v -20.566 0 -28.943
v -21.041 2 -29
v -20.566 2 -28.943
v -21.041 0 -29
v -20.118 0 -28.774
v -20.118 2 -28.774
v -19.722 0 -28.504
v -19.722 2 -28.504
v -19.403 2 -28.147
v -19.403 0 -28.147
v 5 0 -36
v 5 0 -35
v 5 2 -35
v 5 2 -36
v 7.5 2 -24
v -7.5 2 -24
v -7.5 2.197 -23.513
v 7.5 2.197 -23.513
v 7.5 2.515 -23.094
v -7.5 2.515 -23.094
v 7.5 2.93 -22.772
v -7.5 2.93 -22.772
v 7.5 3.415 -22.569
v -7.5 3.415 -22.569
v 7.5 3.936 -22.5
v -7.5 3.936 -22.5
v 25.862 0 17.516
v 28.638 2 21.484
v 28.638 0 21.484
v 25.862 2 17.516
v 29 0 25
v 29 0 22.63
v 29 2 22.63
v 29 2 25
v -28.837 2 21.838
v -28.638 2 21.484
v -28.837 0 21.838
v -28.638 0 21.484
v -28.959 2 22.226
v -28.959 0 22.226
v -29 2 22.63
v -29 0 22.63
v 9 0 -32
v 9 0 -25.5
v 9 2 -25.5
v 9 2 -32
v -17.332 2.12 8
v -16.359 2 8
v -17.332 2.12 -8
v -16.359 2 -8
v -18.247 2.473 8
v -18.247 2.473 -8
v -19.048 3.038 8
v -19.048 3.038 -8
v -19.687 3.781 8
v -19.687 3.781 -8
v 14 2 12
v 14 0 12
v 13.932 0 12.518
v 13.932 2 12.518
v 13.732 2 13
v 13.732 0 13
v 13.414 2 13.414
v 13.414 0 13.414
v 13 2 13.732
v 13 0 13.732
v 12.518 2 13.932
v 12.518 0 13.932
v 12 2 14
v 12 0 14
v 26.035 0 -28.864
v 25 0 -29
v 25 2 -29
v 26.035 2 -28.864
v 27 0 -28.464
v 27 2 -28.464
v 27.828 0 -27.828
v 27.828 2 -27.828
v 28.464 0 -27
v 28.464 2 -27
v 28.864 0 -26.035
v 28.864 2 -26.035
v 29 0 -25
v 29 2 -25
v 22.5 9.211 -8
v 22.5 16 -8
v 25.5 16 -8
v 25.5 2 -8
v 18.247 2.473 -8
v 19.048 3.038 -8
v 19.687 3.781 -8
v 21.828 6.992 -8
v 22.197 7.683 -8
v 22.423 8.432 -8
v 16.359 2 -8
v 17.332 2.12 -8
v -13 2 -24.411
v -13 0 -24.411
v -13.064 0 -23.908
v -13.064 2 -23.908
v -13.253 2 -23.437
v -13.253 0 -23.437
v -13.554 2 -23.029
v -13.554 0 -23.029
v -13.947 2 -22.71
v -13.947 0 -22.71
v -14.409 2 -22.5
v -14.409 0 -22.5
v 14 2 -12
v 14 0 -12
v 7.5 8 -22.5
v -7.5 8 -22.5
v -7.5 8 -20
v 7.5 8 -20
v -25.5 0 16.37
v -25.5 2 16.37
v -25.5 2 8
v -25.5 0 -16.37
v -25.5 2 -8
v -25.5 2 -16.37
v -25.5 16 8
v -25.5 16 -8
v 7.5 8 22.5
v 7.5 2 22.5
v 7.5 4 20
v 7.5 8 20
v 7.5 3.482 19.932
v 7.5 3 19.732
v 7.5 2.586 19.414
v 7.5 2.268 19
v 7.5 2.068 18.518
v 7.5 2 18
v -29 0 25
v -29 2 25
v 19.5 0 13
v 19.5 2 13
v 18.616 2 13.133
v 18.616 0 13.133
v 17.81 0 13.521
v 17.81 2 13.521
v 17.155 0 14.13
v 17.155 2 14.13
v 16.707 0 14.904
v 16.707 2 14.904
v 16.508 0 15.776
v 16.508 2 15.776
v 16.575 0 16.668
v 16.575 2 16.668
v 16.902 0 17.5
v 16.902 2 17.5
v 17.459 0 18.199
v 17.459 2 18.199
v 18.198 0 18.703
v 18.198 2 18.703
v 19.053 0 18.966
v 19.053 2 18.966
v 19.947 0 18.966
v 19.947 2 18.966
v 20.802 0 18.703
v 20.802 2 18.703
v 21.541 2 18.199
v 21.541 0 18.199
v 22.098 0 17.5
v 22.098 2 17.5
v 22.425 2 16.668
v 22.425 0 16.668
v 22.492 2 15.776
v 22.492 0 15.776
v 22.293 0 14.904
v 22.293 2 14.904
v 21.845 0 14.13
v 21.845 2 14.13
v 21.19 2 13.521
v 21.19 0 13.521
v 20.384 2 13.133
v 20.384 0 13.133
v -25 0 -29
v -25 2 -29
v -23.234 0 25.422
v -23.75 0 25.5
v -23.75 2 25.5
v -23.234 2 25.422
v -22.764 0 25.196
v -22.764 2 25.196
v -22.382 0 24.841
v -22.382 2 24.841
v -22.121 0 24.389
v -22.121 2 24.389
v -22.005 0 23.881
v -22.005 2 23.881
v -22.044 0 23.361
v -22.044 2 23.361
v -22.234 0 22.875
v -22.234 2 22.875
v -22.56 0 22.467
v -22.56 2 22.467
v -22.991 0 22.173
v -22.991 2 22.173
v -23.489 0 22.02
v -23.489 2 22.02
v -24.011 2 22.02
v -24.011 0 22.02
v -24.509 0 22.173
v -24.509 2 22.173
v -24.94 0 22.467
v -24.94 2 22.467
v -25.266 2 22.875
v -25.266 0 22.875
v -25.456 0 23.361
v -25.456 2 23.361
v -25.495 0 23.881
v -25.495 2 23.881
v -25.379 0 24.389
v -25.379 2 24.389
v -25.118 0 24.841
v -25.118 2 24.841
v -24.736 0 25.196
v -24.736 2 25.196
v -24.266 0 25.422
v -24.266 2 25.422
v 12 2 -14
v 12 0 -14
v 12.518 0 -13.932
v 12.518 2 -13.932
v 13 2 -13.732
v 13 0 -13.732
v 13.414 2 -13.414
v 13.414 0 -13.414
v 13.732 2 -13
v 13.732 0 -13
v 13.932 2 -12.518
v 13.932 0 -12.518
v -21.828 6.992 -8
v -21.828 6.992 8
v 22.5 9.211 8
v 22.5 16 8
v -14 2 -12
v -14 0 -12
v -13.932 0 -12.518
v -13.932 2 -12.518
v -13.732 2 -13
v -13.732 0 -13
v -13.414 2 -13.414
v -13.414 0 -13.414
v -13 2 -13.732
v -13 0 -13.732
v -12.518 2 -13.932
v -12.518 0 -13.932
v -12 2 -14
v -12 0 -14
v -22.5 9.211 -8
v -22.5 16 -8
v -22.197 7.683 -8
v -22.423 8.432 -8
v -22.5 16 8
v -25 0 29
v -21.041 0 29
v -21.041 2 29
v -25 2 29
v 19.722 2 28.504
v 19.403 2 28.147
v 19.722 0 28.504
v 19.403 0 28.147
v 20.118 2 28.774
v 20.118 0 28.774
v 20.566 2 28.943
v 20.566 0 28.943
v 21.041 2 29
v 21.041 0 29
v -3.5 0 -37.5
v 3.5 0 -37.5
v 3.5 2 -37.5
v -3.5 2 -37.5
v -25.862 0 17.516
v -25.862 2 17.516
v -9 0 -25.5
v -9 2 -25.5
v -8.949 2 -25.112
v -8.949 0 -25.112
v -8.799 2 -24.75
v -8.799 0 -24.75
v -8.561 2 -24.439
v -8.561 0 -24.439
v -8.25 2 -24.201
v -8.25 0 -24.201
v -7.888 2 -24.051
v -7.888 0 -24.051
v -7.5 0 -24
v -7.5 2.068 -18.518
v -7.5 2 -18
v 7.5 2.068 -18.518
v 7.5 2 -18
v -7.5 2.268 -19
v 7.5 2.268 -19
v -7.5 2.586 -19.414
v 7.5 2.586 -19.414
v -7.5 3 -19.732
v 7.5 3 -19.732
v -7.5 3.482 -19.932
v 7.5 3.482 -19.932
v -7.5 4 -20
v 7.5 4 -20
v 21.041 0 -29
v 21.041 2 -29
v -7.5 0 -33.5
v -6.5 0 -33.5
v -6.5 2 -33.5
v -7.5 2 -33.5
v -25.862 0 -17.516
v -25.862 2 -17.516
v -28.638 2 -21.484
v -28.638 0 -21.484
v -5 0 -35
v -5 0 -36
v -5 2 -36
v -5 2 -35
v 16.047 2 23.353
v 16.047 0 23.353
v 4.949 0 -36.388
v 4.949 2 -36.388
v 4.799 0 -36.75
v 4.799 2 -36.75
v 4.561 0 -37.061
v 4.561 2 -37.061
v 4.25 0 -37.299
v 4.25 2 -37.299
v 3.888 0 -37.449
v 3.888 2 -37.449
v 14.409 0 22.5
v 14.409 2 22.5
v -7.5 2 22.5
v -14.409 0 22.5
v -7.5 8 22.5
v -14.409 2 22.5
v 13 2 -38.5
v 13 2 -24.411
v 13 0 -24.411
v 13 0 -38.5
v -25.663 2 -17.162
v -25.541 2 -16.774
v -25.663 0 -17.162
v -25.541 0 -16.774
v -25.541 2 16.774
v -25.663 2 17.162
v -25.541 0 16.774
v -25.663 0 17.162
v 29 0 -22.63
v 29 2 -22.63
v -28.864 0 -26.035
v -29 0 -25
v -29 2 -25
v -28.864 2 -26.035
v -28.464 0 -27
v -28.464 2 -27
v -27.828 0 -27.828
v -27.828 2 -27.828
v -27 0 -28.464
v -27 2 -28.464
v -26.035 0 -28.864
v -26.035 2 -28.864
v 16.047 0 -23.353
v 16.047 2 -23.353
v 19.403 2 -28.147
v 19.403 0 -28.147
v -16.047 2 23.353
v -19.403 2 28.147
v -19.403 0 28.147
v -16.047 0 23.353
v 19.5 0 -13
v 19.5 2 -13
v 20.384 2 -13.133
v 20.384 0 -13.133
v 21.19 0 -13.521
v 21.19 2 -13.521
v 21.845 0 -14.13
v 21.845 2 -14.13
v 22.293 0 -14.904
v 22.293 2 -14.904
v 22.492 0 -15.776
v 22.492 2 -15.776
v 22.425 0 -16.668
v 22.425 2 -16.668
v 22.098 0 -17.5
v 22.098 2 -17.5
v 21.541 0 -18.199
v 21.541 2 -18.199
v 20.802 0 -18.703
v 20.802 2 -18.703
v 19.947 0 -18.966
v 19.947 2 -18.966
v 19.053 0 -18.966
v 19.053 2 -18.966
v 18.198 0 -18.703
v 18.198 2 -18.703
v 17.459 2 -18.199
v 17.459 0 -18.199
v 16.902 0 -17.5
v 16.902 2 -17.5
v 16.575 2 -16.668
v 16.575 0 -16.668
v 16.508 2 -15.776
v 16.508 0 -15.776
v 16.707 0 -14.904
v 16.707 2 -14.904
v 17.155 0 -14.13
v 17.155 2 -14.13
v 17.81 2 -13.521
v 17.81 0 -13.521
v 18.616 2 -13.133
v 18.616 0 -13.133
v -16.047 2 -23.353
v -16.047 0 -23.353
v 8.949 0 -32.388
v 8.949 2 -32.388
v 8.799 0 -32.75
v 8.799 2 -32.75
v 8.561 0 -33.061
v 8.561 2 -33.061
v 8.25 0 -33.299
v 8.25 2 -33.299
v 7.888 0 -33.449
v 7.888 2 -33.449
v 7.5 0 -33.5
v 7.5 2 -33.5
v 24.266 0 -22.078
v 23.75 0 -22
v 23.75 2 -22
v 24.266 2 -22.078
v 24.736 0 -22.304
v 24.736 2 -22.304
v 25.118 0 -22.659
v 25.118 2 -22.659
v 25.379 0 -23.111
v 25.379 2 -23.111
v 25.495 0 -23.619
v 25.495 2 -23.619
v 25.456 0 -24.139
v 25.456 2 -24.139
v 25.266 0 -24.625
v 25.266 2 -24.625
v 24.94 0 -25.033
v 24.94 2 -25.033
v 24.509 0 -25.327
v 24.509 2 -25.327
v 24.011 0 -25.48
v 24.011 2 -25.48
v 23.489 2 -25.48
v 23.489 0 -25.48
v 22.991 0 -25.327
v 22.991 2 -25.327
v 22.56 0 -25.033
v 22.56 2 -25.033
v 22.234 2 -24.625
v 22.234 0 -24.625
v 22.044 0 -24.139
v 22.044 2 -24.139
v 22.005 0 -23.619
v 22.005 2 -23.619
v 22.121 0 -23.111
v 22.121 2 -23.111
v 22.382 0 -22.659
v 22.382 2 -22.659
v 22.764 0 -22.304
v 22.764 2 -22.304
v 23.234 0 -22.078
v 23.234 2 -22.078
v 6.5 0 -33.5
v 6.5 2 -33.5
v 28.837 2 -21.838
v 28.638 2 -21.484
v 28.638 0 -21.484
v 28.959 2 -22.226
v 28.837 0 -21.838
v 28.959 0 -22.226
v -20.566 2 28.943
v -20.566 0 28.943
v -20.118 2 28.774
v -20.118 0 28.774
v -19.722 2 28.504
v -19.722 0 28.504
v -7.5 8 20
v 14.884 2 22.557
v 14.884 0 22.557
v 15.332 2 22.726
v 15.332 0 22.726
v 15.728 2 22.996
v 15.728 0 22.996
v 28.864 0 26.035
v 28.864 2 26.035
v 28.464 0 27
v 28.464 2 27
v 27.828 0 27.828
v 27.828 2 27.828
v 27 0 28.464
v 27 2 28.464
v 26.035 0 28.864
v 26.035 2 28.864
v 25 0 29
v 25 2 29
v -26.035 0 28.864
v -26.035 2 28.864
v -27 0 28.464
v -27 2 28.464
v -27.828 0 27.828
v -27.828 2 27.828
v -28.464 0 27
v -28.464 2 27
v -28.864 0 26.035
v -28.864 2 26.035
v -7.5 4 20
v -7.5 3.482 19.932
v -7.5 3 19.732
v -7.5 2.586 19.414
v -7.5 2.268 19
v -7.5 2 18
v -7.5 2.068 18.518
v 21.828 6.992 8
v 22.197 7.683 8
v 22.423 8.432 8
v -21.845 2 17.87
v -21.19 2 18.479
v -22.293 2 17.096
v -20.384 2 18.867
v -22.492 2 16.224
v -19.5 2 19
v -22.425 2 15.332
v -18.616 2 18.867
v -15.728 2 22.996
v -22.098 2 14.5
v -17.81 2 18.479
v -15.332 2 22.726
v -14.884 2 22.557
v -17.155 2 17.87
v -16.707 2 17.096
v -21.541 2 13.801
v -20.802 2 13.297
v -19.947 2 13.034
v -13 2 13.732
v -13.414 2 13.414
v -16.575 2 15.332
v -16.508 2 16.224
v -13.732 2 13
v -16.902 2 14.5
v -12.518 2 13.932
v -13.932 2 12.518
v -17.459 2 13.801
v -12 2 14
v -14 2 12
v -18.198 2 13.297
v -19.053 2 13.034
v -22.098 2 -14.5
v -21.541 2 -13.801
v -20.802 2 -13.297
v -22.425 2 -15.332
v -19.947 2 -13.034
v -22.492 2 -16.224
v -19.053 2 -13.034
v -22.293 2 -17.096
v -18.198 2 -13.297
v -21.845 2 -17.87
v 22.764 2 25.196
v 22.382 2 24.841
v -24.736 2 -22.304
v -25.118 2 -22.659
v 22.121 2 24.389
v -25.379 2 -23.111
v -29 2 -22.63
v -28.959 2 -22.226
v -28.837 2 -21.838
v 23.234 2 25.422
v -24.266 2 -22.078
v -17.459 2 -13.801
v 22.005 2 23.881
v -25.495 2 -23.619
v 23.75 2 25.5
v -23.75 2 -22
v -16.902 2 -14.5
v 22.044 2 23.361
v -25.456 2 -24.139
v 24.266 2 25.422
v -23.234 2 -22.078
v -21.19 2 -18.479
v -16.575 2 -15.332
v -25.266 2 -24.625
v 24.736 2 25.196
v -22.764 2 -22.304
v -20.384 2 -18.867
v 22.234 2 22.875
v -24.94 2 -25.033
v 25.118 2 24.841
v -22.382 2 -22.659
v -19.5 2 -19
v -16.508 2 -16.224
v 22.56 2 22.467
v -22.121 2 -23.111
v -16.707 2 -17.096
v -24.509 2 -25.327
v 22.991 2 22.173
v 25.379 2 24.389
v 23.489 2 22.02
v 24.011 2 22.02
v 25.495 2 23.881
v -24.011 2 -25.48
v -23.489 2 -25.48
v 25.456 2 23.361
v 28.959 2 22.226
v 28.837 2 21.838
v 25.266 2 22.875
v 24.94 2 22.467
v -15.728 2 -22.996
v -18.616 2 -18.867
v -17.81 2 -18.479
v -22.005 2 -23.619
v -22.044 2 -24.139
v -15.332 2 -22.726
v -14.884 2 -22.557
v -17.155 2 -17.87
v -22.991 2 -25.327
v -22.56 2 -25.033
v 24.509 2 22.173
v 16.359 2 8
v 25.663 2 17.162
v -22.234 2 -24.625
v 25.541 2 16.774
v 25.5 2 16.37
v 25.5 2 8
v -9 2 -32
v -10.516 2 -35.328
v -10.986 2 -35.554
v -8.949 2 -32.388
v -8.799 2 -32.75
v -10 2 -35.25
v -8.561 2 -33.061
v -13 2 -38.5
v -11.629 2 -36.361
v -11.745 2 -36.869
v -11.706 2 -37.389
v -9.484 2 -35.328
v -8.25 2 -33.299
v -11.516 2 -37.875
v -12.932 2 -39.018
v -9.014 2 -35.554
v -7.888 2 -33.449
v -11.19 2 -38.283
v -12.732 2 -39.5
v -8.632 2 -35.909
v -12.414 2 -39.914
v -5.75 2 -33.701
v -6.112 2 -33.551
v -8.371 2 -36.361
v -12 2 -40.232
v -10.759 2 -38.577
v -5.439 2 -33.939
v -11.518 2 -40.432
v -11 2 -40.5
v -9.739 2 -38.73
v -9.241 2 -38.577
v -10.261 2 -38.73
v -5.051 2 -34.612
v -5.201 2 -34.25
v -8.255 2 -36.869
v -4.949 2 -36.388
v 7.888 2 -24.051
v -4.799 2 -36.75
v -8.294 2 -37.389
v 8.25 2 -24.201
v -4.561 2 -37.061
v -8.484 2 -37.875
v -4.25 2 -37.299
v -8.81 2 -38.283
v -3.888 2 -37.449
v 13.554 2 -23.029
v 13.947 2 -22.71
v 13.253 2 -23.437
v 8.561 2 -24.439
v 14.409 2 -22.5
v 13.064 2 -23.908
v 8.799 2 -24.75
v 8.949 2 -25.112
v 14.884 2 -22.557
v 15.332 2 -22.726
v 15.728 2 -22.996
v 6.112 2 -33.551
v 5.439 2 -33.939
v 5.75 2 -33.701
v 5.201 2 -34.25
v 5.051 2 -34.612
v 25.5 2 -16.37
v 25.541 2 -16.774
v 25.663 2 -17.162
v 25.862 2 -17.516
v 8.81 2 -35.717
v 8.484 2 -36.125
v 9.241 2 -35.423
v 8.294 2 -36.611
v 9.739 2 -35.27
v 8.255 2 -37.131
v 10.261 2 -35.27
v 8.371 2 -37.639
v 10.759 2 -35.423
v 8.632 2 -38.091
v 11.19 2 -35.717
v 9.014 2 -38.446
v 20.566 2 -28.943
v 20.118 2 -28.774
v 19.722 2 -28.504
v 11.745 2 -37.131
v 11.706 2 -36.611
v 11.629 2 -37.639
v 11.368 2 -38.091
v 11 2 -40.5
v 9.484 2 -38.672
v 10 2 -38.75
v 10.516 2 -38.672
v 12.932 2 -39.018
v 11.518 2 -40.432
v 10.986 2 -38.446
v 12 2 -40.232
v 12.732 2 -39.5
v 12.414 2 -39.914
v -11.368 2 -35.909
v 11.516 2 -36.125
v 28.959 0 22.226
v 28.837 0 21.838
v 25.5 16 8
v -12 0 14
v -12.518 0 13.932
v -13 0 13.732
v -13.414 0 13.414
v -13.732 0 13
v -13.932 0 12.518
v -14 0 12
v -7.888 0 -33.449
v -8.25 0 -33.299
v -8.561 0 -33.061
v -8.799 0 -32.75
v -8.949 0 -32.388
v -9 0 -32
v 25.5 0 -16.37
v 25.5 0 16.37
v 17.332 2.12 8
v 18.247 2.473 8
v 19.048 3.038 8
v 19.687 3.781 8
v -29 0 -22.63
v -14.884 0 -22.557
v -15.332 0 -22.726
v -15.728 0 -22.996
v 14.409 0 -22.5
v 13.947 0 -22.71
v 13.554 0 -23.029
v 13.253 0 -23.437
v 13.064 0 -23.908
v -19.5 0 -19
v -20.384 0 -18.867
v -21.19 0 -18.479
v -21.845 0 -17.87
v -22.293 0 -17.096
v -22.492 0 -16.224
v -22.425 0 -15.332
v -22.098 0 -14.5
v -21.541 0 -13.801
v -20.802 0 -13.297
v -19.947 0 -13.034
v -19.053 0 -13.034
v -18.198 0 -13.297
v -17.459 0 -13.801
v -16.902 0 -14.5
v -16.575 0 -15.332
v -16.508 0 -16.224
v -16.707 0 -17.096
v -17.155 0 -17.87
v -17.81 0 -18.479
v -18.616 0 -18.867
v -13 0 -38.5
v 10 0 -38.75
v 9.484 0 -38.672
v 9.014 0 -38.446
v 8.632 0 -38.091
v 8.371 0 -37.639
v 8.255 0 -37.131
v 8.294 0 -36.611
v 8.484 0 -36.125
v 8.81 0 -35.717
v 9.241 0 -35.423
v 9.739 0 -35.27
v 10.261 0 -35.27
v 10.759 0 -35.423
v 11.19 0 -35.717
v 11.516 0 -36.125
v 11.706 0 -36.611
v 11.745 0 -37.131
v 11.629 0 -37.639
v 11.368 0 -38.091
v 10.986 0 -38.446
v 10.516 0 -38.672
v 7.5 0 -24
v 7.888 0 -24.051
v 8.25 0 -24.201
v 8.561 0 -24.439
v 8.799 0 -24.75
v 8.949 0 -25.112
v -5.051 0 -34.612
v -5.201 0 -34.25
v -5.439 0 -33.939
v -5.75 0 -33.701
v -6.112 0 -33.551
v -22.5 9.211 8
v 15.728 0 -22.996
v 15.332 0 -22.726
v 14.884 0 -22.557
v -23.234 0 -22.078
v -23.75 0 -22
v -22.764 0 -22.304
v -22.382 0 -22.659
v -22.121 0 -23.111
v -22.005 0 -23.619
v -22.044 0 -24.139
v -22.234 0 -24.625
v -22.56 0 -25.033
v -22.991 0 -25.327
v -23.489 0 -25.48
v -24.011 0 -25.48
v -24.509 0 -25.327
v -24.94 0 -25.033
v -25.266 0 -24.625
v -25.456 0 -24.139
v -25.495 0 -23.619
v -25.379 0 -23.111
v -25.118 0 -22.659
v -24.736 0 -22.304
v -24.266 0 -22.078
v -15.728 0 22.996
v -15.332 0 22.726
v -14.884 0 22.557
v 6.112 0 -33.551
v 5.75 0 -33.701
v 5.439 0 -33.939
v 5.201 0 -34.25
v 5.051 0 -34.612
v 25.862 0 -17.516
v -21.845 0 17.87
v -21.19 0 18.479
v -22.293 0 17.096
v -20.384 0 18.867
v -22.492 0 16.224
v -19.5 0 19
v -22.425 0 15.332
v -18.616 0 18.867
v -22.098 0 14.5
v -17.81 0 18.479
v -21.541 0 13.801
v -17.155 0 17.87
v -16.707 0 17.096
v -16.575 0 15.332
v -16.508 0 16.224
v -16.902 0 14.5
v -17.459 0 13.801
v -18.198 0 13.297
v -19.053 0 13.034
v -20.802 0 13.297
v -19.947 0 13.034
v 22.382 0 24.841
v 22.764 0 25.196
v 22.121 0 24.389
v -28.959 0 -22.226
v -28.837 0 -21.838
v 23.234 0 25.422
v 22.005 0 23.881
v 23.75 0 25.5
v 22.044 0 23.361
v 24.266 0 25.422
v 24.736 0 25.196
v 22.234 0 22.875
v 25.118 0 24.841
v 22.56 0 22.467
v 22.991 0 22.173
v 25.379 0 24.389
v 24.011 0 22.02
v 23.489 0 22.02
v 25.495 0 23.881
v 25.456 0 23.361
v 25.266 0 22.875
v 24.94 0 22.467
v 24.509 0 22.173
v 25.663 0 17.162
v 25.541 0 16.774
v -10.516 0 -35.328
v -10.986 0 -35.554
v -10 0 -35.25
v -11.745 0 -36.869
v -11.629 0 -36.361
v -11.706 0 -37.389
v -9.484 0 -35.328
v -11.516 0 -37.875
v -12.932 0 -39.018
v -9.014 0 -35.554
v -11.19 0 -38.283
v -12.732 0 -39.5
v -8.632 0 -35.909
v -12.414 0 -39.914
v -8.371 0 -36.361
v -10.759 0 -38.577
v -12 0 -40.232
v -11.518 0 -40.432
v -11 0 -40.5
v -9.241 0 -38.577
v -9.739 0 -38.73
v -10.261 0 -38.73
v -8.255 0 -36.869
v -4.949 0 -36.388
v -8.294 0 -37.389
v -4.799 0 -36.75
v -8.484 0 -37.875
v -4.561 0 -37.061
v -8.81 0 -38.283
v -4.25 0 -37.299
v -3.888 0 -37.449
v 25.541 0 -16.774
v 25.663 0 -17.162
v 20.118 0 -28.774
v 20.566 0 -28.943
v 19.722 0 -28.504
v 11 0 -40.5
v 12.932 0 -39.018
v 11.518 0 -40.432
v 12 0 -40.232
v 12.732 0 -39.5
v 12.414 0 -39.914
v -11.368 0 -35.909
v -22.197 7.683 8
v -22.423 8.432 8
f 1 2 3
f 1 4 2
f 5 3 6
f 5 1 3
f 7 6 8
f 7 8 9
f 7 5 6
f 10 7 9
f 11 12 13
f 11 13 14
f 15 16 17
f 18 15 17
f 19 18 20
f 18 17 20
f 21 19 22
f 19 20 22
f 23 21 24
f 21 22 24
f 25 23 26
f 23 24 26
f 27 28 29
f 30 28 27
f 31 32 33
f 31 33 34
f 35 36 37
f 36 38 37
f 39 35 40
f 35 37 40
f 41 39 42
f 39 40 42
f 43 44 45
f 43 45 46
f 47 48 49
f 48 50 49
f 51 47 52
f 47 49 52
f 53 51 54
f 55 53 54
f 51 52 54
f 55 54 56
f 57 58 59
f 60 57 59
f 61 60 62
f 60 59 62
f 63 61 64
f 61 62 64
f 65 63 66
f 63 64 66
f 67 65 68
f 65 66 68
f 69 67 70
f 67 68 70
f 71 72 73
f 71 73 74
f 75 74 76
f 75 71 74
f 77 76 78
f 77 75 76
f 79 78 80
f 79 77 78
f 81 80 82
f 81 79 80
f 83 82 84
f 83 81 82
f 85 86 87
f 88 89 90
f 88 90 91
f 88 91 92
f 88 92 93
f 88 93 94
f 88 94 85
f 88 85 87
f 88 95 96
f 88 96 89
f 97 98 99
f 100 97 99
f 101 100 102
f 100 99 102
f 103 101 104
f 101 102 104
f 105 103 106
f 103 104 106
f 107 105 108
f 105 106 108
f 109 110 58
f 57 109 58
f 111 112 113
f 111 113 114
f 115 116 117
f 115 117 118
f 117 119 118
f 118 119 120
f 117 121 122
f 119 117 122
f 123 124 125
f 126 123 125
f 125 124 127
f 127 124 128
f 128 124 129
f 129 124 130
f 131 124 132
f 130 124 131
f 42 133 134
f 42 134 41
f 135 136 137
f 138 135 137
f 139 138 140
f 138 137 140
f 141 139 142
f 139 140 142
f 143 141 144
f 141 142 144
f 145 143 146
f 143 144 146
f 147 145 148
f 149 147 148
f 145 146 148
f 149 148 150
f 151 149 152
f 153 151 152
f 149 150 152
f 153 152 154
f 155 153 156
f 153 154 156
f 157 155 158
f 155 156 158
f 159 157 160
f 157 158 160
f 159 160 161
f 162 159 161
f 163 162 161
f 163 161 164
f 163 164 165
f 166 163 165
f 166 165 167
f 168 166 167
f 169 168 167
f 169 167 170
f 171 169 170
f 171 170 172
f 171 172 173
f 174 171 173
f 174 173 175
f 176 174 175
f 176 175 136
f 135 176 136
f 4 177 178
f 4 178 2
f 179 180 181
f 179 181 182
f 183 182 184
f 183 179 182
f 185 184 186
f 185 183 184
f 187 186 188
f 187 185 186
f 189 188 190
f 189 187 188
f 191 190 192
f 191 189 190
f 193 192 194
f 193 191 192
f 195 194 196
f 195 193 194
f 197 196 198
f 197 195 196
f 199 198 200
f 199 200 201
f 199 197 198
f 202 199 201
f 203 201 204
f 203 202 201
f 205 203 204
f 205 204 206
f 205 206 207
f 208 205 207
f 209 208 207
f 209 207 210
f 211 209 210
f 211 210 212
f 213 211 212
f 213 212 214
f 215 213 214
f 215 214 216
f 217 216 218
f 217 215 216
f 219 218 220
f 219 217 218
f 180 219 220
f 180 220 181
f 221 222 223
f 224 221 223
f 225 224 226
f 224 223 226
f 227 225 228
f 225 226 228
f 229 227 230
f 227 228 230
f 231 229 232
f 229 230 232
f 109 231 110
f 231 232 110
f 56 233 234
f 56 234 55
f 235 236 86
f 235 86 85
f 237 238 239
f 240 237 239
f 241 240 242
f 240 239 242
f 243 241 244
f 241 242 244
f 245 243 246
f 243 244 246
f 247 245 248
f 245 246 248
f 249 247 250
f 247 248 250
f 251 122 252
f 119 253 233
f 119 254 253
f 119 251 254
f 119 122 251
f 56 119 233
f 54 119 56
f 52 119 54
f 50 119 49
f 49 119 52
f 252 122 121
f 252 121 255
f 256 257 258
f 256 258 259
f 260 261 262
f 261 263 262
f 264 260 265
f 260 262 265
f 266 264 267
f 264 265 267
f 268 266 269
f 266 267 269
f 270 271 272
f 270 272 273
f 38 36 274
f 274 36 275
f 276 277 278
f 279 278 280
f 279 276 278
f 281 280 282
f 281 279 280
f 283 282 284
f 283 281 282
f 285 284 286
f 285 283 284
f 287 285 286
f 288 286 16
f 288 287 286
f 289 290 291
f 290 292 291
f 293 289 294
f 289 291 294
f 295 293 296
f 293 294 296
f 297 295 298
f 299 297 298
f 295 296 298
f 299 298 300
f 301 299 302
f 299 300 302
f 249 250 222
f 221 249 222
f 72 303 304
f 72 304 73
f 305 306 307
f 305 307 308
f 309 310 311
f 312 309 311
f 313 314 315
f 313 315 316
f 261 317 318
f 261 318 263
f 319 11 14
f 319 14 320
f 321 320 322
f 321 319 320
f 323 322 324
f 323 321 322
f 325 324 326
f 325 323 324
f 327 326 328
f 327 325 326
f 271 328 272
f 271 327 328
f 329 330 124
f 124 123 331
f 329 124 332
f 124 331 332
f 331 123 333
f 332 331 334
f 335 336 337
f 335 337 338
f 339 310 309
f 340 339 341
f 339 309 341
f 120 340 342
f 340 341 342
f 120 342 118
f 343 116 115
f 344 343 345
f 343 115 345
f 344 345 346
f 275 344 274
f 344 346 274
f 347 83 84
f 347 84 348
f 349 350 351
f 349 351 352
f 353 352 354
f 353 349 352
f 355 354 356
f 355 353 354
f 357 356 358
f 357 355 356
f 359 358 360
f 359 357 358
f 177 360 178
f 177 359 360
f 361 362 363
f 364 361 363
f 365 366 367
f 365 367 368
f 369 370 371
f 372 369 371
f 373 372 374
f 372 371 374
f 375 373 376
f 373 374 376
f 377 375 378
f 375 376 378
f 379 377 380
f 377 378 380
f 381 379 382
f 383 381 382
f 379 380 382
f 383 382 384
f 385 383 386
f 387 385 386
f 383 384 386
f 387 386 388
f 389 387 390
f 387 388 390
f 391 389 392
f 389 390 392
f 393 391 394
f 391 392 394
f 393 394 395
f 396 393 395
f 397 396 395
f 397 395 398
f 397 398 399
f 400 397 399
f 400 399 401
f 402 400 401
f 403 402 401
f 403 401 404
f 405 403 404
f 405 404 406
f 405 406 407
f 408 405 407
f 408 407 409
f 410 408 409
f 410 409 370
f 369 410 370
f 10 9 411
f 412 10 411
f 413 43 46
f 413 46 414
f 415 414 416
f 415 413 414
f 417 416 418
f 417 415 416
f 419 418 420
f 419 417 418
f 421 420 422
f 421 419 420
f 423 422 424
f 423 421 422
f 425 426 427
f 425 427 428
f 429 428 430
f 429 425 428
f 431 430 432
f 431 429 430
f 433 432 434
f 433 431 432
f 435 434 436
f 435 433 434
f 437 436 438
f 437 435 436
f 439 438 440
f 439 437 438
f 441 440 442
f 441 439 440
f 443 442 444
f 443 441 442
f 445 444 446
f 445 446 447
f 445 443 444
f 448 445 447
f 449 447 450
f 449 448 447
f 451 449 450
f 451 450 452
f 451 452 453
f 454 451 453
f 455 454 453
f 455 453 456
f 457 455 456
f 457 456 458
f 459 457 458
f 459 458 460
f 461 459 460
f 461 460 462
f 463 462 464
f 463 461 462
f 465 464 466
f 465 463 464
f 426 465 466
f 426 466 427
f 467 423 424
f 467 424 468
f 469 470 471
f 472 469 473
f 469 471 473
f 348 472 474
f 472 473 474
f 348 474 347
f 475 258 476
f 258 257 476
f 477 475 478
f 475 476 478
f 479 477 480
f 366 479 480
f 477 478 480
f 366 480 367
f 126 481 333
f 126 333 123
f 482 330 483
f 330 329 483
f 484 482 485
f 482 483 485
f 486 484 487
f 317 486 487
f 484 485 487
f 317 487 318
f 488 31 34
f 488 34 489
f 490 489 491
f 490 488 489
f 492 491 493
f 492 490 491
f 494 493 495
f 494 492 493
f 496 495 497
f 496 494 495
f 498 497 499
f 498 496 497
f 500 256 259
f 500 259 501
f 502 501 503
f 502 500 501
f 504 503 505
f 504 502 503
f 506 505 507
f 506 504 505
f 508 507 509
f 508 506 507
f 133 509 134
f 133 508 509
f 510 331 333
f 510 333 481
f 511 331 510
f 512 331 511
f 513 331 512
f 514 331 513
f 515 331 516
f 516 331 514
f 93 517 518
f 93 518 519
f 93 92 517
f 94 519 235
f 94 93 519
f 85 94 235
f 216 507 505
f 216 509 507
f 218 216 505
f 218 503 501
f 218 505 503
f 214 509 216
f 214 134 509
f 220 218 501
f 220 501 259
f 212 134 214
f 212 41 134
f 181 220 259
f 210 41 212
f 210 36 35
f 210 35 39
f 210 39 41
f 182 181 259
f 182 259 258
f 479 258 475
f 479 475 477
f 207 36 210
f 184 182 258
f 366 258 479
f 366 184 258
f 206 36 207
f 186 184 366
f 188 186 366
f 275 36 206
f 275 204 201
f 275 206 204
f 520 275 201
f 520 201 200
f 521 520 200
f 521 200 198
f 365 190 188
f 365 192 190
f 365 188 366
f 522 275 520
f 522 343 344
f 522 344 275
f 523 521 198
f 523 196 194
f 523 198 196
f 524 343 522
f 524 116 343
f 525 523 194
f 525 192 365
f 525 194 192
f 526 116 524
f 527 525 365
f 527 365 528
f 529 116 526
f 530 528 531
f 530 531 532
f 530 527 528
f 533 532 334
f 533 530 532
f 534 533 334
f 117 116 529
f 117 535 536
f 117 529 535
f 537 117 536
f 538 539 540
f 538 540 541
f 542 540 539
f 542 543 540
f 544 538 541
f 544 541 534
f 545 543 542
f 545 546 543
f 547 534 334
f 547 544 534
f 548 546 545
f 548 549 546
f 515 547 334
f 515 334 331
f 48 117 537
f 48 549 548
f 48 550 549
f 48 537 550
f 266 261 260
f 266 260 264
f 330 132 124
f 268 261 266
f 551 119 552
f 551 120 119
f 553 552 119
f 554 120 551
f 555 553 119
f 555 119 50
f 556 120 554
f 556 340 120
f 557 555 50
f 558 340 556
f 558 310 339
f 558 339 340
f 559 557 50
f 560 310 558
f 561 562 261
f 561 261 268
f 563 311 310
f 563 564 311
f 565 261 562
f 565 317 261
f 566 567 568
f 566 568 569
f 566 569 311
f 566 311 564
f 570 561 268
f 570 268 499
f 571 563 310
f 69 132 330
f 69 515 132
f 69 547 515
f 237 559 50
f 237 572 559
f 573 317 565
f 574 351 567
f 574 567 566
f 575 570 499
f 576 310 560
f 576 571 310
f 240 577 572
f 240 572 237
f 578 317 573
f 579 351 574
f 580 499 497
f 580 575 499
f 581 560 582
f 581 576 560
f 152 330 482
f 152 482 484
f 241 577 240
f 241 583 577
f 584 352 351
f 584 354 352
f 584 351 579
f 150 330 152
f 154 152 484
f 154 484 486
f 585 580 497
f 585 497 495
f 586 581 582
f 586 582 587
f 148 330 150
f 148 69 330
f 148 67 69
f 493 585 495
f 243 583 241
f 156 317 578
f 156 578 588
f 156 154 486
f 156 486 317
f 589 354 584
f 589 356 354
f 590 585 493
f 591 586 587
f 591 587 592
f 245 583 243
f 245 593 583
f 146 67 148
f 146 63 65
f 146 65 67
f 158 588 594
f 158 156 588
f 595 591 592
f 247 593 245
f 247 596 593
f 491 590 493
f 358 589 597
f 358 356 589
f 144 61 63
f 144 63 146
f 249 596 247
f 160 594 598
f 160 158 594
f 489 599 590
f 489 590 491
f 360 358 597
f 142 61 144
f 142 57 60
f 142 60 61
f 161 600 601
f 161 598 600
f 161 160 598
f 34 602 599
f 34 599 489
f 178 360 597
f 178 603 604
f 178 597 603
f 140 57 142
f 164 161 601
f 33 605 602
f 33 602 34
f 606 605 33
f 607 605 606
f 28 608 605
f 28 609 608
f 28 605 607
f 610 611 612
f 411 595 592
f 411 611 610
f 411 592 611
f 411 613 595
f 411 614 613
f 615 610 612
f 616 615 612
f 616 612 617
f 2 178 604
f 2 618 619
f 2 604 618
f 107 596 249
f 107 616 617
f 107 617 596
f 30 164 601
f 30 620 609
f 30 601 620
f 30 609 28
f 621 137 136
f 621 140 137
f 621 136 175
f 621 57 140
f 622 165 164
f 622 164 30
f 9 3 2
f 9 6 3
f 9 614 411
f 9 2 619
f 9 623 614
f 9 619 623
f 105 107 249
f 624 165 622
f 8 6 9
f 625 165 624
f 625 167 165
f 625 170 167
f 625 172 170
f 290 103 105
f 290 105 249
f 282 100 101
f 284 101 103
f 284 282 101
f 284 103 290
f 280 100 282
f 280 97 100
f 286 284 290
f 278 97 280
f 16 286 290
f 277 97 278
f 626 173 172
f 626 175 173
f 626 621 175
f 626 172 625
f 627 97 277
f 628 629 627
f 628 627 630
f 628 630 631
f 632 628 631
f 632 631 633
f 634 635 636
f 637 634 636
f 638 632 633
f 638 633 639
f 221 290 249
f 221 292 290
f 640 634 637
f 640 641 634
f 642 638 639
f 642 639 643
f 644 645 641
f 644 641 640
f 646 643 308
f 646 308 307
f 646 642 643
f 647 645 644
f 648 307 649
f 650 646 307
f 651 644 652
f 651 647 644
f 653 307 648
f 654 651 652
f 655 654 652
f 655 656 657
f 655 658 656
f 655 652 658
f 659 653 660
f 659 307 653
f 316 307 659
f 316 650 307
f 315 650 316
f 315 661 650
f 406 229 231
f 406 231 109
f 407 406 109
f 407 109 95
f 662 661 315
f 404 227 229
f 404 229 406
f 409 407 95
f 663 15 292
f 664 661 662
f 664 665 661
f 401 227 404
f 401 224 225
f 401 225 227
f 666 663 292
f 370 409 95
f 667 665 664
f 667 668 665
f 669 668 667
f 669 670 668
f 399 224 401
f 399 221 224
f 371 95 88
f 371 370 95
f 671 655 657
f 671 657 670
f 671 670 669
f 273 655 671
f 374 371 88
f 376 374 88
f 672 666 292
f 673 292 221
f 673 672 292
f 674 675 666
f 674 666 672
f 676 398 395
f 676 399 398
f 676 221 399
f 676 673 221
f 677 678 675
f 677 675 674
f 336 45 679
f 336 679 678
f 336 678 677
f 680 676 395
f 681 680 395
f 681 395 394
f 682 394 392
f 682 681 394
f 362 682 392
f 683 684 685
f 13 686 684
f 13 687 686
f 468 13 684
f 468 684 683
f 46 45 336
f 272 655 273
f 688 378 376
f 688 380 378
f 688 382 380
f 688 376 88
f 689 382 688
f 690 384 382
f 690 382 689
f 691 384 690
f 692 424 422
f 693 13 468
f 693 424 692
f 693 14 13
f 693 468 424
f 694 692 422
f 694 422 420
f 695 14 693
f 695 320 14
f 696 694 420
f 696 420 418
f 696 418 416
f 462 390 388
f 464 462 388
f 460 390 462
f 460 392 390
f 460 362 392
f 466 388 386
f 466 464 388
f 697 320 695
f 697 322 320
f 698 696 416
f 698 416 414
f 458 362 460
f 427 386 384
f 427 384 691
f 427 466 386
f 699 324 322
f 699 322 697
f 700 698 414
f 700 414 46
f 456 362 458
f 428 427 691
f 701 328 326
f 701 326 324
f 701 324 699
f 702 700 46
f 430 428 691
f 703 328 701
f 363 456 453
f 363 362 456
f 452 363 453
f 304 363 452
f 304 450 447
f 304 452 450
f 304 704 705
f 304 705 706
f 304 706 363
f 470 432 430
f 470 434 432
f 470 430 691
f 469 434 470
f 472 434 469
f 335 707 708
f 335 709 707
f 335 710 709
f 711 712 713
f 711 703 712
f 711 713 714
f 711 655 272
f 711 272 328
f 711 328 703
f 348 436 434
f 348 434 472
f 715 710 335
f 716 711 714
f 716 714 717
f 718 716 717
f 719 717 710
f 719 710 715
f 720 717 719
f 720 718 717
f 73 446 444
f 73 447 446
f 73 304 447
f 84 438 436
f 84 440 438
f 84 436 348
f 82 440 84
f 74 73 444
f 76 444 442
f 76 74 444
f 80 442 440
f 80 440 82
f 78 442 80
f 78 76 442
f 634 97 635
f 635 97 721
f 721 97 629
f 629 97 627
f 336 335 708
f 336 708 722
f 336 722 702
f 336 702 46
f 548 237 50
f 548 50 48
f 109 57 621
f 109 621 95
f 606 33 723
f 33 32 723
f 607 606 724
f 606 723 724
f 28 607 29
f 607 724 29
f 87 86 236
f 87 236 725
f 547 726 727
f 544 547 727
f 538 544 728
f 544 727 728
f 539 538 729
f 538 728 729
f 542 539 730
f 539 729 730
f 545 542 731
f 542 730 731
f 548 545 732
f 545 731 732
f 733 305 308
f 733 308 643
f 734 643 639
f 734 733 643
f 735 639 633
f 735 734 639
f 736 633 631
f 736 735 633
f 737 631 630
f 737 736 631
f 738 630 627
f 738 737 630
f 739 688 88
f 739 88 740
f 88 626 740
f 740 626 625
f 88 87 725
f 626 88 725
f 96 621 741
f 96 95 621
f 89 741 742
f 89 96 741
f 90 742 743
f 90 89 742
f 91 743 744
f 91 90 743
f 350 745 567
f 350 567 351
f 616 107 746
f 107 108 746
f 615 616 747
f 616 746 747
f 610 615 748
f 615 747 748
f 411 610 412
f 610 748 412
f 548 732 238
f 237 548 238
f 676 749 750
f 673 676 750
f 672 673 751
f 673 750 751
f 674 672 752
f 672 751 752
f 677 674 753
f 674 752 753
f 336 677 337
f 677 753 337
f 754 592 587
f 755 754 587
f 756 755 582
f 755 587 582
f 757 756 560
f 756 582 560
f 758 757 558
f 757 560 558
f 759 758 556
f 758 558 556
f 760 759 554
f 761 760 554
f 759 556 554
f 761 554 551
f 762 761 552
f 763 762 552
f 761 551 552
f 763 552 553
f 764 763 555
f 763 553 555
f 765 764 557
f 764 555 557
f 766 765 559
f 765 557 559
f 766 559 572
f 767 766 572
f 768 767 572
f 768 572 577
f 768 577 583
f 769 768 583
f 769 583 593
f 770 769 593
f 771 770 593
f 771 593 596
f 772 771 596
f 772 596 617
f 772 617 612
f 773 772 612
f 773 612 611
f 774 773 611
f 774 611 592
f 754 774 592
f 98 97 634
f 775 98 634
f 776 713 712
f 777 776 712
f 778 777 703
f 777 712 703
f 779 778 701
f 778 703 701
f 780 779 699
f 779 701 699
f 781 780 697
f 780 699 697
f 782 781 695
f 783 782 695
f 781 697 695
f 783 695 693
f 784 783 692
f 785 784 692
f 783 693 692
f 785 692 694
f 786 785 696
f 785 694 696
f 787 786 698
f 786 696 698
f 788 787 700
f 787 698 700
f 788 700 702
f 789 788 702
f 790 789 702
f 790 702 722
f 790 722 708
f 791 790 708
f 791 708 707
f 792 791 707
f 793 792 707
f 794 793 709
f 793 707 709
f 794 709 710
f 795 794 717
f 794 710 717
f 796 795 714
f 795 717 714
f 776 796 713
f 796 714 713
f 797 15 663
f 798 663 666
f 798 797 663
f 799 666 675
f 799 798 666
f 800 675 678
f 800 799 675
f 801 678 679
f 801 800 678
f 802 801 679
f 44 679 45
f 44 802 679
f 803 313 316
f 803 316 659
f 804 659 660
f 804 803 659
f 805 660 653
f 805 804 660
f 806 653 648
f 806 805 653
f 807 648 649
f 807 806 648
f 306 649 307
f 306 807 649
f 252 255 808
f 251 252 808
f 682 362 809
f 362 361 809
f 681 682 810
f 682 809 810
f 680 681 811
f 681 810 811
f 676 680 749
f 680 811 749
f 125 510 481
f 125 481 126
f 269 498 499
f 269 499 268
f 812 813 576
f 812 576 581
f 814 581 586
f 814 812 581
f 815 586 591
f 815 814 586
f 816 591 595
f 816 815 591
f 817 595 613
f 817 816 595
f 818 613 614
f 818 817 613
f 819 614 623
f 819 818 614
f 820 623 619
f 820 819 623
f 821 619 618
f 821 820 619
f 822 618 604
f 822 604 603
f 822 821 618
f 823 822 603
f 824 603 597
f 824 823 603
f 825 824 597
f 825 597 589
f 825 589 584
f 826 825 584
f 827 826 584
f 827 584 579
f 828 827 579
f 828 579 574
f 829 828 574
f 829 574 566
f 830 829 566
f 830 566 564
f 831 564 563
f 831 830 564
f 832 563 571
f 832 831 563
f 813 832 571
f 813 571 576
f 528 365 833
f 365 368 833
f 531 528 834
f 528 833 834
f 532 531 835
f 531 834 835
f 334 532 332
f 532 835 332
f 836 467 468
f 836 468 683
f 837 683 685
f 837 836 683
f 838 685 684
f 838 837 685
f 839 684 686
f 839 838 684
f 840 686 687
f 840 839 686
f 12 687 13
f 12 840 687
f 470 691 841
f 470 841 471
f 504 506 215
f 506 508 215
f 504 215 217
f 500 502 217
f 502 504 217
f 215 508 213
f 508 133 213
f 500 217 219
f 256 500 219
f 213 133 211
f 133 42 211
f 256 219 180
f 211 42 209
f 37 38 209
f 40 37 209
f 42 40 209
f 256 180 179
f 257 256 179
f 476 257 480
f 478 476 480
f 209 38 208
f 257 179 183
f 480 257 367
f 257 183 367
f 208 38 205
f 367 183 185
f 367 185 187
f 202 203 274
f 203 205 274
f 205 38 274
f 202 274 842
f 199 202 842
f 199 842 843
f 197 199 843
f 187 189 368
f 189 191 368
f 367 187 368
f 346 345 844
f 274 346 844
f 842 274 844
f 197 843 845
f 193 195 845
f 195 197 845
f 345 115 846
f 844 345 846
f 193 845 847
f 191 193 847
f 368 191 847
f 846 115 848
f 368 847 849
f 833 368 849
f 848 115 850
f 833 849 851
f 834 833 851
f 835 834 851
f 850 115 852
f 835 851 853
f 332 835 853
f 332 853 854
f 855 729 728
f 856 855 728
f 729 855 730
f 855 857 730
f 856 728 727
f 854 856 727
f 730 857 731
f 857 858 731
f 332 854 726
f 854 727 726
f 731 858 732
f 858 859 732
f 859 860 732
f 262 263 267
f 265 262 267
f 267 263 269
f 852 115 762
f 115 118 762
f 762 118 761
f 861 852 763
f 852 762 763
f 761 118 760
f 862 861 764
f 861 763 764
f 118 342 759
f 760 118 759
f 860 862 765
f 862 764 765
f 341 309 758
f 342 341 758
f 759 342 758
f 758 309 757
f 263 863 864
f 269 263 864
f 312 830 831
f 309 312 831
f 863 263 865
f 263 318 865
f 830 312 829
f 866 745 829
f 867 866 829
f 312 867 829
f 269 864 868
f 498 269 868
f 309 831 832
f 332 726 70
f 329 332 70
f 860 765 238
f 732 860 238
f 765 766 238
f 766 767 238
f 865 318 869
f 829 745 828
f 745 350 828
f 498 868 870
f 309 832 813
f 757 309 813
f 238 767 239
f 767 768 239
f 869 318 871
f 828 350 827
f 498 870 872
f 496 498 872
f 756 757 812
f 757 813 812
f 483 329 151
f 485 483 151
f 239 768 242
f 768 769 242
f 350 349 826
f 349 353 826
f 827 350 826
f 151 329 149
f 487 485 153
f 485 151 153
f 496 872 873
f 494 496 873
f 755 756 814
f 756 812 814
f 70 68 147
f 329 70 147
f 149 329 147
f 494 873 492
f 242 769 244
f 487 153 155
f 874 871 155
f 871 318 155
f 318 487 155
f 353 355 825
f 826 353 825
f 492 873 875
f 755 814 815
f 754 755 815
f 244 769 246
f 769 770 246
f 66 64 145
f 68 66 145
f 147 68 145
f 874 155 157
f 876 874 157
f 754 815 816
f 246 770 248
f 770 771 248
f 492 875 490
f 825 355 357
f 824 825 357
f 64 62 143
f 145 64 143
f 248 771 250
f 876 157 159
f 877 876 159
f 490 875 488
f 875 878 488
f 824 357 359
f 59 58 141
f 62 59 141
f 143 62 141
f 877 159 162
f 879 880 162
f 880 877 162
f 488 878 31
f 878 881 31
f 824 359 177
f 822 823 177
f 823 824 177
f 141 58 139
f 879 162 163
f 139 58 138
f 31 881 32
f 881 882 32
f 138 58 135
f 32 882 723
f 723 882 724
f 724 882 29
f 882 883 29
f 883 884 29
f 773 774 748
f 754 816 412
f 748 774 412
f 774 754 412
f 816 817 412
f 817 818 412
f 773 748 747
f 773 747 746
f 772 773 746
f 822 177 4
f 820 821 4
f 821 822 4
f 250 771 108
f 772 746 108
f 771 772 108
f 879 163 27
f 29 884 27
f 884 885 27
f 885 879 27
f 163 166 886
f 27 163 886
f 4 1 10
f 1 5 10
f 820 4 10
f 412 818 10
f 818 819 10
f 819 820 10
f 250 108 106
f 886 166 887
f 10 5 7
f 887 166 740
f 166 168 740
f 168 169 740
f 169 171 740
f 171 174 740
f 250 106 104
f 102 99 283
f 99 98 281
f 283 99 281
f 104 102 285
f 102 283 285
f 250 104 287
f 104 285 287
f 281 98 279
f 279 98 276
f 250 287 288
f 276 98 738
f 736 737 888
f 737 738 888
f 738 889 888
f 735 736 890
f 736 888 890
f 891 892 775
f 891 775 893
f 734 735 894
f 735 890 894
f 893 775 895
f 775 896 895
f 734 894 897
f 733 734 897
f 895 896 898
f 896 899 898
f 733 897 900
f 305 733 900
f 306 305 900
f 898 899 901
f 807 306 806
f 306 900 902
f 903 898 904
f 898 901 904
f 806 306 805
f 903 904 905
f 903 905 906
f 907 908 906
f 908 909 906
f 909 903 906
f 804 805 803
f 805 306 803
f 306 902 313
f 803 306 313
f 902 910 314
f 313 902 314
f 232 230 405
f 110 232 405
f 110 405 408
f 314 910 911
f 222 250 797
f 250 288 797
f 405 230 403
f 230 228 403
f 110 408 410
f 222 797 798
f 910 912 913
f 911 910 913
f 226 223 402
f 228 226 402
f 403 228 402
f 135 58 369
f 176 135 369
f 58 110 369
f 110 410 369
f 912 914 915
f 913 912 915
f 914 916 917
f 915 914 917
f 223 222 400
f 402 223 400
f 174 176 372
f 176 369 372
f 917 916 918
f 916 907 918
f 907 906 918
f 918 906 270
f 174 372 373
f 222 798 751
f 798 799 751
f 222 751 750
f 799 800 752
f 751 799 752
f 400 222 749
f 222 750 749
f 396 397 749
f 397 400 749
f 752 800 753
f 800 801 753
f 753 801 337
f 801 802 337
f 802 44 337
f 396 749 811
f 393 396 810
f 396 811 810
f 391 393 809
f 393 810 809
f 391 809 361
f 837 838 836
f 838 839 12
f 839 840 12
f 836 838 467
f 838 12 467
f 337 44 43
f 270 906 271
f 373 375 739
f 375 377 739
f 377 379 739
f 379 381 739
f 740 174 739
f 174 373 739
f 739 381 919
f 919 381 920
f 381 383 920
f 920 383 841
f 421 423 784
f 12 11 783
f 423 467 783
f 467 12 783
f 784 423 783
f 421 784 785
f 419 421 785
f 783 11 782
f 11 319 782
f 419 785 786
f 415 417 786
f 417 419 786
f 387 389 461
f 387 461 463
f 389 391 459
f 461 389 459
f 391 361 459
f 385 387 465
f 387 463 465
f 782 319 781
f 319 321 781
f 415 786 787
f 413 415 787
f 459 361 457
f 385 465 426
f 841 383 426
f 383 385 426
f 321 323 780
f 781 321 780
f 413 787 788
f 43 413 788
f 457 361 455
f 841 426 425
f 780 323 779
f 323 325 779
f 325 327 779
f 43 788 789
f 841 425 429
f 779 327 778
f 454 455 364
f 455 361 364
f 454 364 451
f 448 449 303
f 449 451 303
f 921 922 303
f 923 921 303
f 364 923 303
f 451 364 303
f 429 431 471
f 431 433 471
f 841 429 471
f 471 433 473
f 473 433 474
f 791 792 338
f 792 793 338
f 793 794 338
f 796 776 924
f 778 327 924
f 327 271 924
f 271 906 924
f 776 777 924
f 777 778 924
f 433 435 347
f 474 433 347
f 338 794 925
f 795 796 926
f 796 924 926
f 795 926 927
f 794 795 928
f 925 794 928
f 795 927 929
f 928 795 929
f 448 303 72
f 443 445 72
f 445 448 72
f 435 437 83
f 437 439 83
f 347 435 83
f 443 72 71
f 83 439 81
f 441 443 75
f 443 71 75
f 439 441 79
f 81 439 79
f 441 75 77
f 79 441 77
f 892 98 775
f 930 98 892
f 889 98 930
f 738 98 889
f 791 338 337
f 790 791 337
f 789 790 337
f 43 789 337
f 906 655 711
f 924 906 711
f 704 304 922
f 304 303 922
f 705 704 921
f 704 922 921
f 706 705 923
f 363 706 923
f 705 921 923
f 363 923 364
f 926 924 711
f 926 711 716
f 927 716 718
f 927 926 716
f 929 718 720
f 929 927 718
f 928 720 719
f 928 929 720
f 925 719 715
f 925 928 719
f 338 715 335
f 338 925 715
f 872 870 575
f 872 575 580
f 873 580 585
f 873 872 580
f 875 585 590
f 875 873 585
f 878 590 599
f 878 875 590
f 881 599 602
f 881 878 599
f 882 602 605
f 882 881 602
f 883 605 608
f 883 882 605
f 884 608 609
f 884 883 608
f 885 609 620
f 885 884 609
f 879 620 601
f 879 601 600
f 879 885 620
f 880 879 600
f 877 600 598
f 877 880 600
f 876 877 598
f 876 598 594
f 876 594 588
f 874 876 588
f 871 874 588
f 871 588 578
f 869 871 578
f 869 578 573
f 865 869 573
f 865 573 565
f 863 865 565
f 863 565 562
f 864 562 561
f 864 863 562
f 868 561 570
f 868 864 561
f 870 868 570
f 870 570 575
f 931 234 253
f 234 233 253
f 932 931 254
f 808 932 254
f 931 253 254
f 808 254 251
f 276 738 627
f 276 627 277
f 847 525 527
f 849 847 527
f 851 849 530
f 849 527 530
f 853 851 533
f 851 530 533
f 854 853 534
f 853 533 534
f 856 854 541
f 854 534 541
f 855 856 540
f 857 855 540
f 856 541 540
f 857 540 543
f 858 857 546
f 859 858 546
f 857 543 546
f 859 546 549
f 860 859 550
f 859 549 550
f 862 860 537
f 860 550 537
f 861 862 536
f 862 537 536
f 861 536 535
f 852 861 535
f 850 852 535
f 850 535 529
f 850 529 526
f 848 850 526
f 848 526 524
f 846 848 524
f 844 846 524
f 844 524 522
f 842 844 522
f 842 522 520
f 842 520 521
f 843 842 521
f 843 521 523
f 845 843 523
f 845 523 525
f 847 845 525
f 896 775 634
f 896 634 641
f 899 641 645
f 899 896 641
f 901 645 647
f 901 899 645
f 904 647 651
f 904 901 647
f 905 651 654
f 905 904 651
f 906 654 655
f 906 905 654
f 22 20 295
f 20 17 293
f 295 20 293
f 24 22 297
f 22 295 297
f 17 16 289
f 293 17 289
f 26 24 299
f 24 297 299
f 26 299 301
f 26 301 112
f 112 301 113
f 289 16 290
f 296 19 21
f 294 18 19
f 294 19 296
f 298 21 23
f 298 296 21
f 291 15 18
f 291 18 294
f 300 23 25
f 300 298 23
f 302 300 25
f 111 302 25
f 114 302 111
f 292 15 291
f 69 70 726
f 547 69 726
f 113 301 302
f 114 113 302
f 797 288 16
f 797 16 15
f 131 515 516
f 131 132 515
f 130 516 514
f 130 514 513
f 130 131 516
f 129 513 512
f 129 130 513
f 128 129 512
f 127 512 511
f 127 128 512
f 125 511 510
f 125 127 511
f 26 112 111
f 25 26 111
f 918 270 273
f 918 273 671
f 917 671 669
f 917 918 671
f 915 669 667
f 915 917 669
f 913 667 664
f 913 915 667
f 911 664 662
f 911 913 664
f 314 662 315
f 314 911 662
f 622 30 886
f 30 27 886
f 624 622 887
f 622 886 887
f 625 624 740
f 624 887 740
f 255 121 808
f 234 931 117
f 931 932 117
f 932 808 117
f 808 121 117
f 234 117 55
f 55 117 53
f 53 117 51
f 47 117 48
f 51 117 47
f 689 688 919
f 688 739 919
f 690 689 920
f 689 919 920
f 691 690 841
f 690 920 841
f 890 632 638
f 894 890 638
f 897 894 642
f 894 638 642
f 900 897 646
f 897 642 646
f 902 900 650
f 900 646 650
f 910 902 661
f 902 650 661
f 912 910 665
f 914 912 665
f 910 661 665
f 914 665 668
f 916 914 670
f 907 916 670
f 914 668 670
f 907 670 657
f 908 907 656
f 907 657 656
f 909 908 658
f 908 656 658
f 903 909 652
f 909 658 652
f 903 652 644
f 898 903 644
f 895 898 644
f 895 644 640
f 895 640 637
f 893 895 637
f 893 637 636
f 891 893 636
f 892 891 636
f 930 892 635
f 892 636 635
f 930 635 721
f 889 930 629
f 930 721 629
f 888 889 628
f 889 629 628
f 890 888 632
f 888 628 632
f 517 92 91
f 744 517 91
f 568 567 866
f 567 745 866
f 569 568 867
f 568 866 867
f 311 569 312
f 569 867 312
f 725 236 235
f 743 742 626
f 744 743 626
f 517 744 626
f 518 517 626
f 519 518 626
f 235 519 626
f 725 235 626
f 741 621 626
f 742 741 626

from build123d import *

# Parameters (mm, degrees)
SKETCH1_R              = 1.75
BOSS_EXTRUDE1_DEPTH    = 2
SKETCH2_W              = 7
SKETCH2_H              = 16
BOSS_EXTRUDE2_DEPTH    = 14
CUT_EXTRUDE1_DEPTH     = 50.658836072
SKETCH5_W              = 15
SKETCH5_H              = 2.5
BOSS_EXTRUDE3_DEPTH    = 6
CUT_EXTRUDE2_DEPTH     = 44.33589736
FILLET2_R              = 2
SKETCH7_R              = 3
CUT_EXTRUDE3_DEPTH     = 44.33589736
SKETCH8_W              = 26
SKETCH8_H              = 18
SKETCH8_R              = 1.75
PINOUT_BD_HOLDER_DEPTH = 2
WEIGH_REDUCER_DEPTH    = 53.318734694
FILLET3_R              = 4
FILLET4_R              = 2
FILLET5_DEPTH          = 2
FILLET5_START          = -7.5
FILLET5_2_DEPTH        = 15
FILLET5_START_2        = -1
FILLET5_3_DEPTH        = 4


with BuildPart() as part:
    # Sketch1 → Boss-Extrude1 (new body)
    with BuildSketch(Plane(origin=(0, 0, 0), x_dir=(1, 0, 0), z_dir=(0, 1, 0))):
        with BuildLine():
            Line((-25, 29), (25, 29))
            ThreePointArc((25, 29), (27.828427125, 27.828427125), (29, 25))
            Line((29, 25), (29, -25))
            ThreePointArc((29, -25), (27.828427125, -27.828427125), (25, -29))
            Line((25, -29), (-25, -29))
            ThreePointArc((-25, -29), (-27.828427125, -27.828427125), (-29, -25))
            Line((-29, -25), (-29, 25))
            ThreePointArc((-29, 25), (-27.828427125, 27.828427125), (-25, 29))
        make_face()
        with Locations(Location((23.75, 23.75, 0), (0, 0, 270))):
            Circle(SKETCH1_R, mode=Mode.SUBTRACT)
        with Locations(Location((23.75, -23.75, 0), (0, 0, 270))):
            Circle(SKETCH1_R, mode=Mode.SUBTRACT)
        with Locations(Location((-23.75, -23.75, 0), (0, 0, 270))):
            Circle(SKETCH1_R, mode=Mode.SUBTRACT)
        with Locations(Location((-23.75, 23.75, 0), (0, 0, 270))):
            Circle(SKETCH1_R, mode=Mode.SUBTRACT)
        with BuildLine():
            Line((-12, 14), (12, 14))
            ThreePointArc((12, 14), (13.414213562, 13.414213562), (14, 12))
            Line((14, 12), (14, -12))
            ThreePointArc((14, -12), (13.414213562, -13.414213562), (12, -14))
            Line((12, -14), (-12, -14))
            ThreePointArc((-12, -14), (-13.414213562, -13.414213562), (-14, -12))
            Line((-14, -12), (-14, 12))
            ThreePointArc((-14, 12), (-13.414213562, 13.414213562), (-12, 14))
        make_face(mode=Mode.SUBTRACT)
    extrude(amount=BOSS_EXTRUDE1_DEPTH)

    # Sketch2 → Boss-Extrude2 (add)
    with BuildSketch(Plane(origin=(0, 2, 0), x_dir=(1, 0, 0), z_dir=(0, 1, 0))):
        with Locations((-22, 0)):
            Rectangle(SKETCH2_W, SKETCH2_H)
        with Locations((22, 0)):
            Rectangle(SKETCH2_W, SKETCH2_H)
    extrude(amount=BOSS_EXTRUDE2_DEPTH)

    # Sketch4 → Cut-Extrude1 (cut, through all)
    with BuildSketch(Plane.XY.offset(8)):
        Polygon((-18.5, 16), (-22.5, 16), (-22.5, 8), (-18.5, 2), align=None)
        Polygon((18.5, 2), (18.5, 16), (22.5, 16), (22.5, 8), align=None)
    extrude(amount=-CUT_EXTRUDE1_DEPTH, mode=Mode.SUBTRACT)

    # Sketch5 → Boss-Extrude3 (add)
    with BuildSketch(Plane(origin=(0, 2, 0), x_dir=(1, 0, 0), z_dir=(0, 1, 0))):
        with Locations((0, 21.25)):
            Rectangle(SKETCH5_W, SKETCH5_H)
        with Locations((0, -21.25)):
            Rectangle(SKETCH5_W, SKETCH5_H)
    extrude(amount=BOSS_EXTRUDE3_DEPTH)

    # Sketch6 → Cut-Extrude2 (cut, through all)
    with BuildSketch(Plane(origin=(0, 2, 0), x_dir=(1, 0, 0), z_dir=(0, 1, 0))):
        Polygon((-25.5, 8), (-25.5, 17), (-29, 22), (-29, -22), (-25.5, -17), (-25.5, -8), align=None)
        Polygon((-15.45, -22.5), (-7.5, -22.5), (7.5, -22.5), (15.45, -22.5), (20, -29), (-20, -29), align=None)
        Polygon((29, 22), (29, -22), (25.5, -17), (25.5, -8), (25.5, 8), (25.5, 17), align=None)
        Polygon((-7.5, 22.5), (7.5, 22.5), (15.45, 22.5), (20, 29), (-20, 29), (-15.45, 22.5), align=None)
    extrude(amount=-CUT_EXTRUDE2_DEPTH, mode=Mode.SUBTRACT)

    # Fillet2
    fillet2_edges = [part.edges().sort_by_distance(p)[0] for p in [
        (-25.5, 1, -17),
        (-25.5, 1, 17),
        (-29, 1, 22),
        (-29, 1, -22),
        (-20, 1, 29),
        (-15.45, 1, 22.5),
        (15.45, 1, 22.5),
        (20, 1, 29),
        (25.5, 1, -17),
        (29, 1, -22),
        (29, 1, 22),
        (25.5, 1, 17),
        (-15.45, 1, -22.5),
        (-20, 1, -29),
        (20, 1, -29),
        (15.45, 1, -22.5),
    ]]
    fillet(fillet2_edges, radius=FILLET2_R)

    # Sketch7 → Cut-Extrude3 (cut, through all)
    with BuildSketch(Plane(origin=(0, 2, 0), x_dir=(1, 0, 0), z_dir=(0, 1, 0))):
        with Locations(Location((19.5, 16, 0), (0, 0, 270))):
            Circle(SKETCH7_R)
        with Locations(Location((19.5, -16, 0), (0, 0, 90))):
            Circle(SKETCH7_R)
        with Locations(Location((-19.5, -16, 0), (0, 0, 270))):
            Circle(SKETCH7_R)
        with Locations(Location((-19.5, 16, 0), (0, 0, 90))):
            Circle(SKETCH7_R)
    extrude(amount=-CUT_EXTRUDE3_DEPTH, mode=Mode.SUBTRACT)

    # Sketch8 → pinout_bd_holder (add)
    with BuildSketch(Plane(origin=(0, 2, 0), x_dir=(1, 0, 0), z_dir=(0, 1, 0))):
        with Locations((0, 31.5)):
            Rectangle(SKETCH8_W, SKETCH8_H)
        with Locations(Location((-10, 37, 0), (0, 0, 270))):
            Circle(SKETCH8_R, mode=Mode.SUBTRACT)
        with Locations(Location((10, 37, 0), (0, 0, 90))):
            Circle(SKETCH8_R, mode=Mode.SUBTRACT)
    extrude(amount=-PINOUT_BD_HOLDER_DEPTH)

    # Sketch9 → Weigh-Reducer (cut, through all)
    with BuildSketch(Plane.XZ):
        with BuildLine():
            Line((-7.5, -24), (7.5, -24))
            ThreePointArc((7.5, -24), (8.560660172, -24.439339828), (9, -25.5))
            Line((9, -25.5), (9, -32))
            ThreePointArc((9, -32), (8.560660172, -33.060660172), (7.5, -33.5))
            Line((7.5, -33.5), (6.5, -33.5))
            ThreePointArc((6.5, -33.5), (5.439339828, -33.939339828), (5, -35))
            Line((5, -35), (5, -36))
            ThreePointArc((5, -36), (4.560660172, -37.060660172), (3.5, -37.5))
            Line((3.5, -37.5), (-3.5, -37.5))
            ThreePointArc((-3.5, -37.5), (-4.560660172, -37.060660172), (-5, -36))
            Line((-5, -36), (-5, -35))
            ThreePointArc((-5, -35), (-5.439339828, -33.939339828), (-6.5, -33.5))
            Line((-6.5, -33.5), (-7.5, -33.5))
            ThreePointArc((-7.5, -33.5), (-8.560660172, -33.060660172), (-9, -32))
            Line((-9, -32), (-9, -25.5))
            ThreePointArc((-9, -25.5), (-8.560660172, -24.439339828), (-7.5, -24))
        make_face()
    extrude(amount=-WEIGH_REDUCER_DEPTH, mode=Mode.SUBTRACT)

    # Fillet3
    fillet3_edges = [part.edges().sort_by_distance(p)[0] for p in [
        (22.5, 8, 0),
        (-18.5, 2, 0),
        (18.5, 2, 0),
        (-22.5, 8, 0),
    ]]
    fillet(fillet3_edges, radius=FILLET3_R)

    # Fillet4
    fillet4_edges = [part.edges().sort_by_distance(p)[0] for p in [
        (0, 2, -20),
        (0, 2, 20),
    ]]
    fillet(fillet4_edges, radius=FILLET4_R)

    # Fillet5: read off the stored shape, not the designer's step
    # Fillet5 outline → Fillet5 (add)
    with BuildSketch(Plane(origin=(0, 0, 0), x_dir=(1, 0, 0), z_dir=(0, 1, 0))):
        with BuildLine():
            Line((-13, 22.5), (-13, 24.410589217))
            ThreePointArc((-13, 24.410589217), (-13.390245011, 23.223707219), (-14.408688877, 22.5))
            Line((-14.408688877, 22.5), (-13, 22.5))
        make_face()
        with BuildLine():
            ThreePointArc((14.408688877, 22.5), (13.390245011, 23.223707219), (13, 24.410589217))
            Line((13, 24.410589217), (13, 22.5))
            Line((13, 22.5), (14.408688877, 22.5))
        make_face()
    extrude(amount=FILLET5_DEPTH)

    # Fillet5 2 outline → Fillet5 2 (add)
    with BuildSketch(Plane.YZ.offset(FILLET5_START)):
        with BuildLine():
            ThreePointArc((2, -24), (2.711746802, -22.91886117), (3.936491673, -22.5))
            Line((3.936491673, -22.5), (2, -22.5))
            Line((2, -22.5), (2, -24))
        make_face()
    extrude(amount=FILLET5_2_DEPTH)

    # Fillet5 3 outline → Fillet5 3 (cut)
    with BuildSketch(Plane(origin=(0, 0, 0), x_dir=(1, 0, 0), z_dir=(0, 1, 0)).offset(FILLET5_START_2)):
        with BuildLine():
            ThreePointArc((-13, 38.5), (-12.414213562, 39.914213562), (-11, 40.5))
            Line((-11, 40.5), (-13, 40.5))
            Line((-13, 40.5), (-13, 38.5))
        make_face()
        with BuildLine():
            ThreePointArc((11, 40.5), (12.414213562, 39.914213562), (13, 38.5))
            Line((13, 38.5), (13, 40.5))
            Line((13, 40.5), (11, 40.5))
        make_face()
    extrude(amount=FILLET5_3_DEPTH, mode=Mode.SUBTRACT)


solid = part.part
